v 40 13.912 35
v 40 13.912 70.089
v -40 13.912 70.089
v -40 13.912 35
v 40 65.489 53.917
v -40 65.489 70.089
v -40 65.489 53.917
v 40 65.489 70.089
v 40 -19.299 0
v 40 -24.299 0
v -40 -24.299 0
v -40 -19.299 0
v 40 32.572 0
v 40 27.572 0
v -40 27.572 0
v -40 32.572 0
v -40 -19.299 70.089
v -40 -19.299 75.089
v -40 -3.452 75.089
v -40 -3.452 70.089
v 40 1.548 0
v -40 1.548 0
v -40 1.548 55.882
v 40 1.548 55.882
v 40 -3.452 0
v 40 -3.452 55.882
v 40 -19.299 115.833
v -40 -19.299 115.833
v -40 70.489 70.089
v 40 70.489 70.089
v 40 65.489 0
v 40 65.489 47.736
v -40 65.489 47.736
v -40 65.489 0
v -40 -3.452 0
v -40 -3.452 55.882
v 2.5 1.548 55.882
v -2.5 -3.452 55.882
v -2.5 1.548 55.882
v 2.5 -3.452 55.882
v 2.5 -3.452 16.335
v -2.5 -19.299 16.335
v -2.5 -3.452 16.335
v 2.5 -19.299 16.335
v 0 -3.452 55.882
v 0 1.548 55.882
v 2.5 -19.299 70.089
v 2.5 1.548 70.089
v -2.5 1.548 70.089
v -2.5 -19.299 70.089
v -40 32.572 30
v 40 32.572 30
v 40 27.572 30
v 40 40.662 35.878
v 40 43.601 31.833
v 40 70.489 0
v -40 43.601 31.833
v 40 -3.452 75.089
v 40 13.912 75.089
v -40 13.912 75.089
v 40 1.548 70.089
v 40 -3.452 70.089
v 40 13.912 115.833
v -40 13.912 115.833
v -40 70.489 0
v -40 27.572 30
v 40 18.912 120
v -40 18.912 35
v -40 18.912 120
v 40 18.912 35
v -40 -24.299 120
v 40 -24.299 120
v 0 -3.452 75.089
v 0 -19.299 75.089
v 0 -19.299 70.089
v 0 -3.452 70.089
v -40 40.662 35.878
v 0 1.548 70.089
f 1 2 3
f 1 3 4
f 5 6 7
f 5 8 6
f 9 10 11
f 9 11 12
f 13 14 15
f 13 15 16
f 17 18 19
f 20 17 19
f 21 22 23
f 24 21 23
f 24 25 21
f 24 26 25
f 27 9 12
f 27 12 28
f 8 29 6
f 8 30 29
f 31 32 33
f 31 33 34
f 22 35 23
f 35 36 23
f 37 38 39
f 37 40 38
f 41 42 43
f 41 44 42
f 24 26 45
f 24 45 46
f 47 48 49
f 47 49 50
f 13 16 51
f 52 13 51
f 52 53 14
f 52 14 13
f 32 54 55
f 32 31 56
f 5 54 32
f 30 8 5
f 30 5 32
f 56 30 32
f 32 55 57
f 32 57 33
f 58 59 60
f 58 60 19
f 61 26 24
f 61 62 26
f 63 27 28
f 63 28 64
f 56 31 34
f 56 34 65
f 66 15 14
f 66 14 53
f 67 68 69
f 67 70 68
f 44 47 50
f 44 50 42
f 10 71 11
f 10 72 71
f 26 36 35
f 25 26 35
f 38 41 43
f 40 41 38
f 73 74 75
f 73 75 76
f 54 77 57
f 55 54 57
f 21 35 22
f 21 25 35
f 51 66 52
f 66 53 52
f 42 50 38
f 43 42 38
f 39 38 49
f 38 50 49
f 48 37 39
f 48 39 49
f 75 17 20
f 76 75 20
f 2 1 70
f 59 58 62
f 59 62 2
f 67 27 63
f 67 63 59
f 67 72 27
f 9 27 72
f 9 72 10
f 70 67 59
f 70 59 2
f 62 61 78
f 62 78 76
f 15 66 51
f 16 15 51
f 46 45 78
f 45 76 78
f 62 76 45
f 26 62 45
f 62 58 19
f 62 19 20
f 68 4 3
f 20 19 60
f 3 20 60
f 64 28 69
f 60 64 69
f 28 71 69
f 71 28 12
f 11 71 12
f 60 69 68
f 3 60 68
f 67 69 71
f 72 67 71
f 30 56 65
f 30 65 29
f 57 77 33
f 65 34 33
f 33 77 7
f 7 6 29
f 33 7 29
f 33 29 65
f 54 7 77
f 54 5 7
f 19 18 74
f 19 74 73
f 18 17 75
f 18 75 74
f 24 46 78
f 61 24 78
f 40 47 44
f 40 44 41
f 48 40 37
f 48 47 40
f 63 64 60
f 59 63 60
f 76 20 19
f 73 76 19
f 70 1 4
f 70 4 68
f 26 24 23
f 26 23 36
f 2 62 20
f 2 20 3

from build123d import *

# Parameters (mm, degrees)
F0_W     = 5
F0_H     = 35.0891035924
F1_DEPTH = 40
F0_H_2   = 30
F2_DEPTH = 2.5
F3_DEPTH = 40
F0_W_2   = 15.8472226467
F0_H_3   = 5
F4_DEPTH = 40


# Not quite as in the source:
# - a feature names something its author has since deleted; it is built from what else it names


with BuildPart() as f1:
    # F0 (on Right) → F1 (new body, symmetric)
    with BuildSketch(Plane.YZ):
        Polygon((13.9119866523, 115.8329709044), (13.9119866523, 120), (-24.2988105118, 120), (-24.2988105118, 115.8329709044), (-19.2988105118, 115.8329709044), align=None)
        Polygon((-24.2988105118, 0), (-19.2988105118, 0), (-19.2988105118, 16.3352508098), (-19.2988105118, 70.0891035924), (-19.2988105118, 75.0891035924), (-19.2988105118, 115.8329709044), (-24.2988105118, 115.8329709044), align=None)
        Polygon((13.9119866523, 70.0891035924), (18.9119866523, 70.0891035924), (18.9119866523, 120), (13.9119866523, 120), (13.9119866523, 115.8329709044), (13.9119866523, 75.0891035924), align=None)
        with Locations((16.4119866523, 52.5445517962)):
            Rectangle(F0_W, F0_H)
        Polygon((0, 70.0891035924), (1.5484121349, 70.0891035924), (13.9119866523, 70.0891035924), (13.9119866523, 75.0891035924), (-3.4515878651, 75.0891035924), (-3.4515878651, 70.0891035924), align=None)
    extrude(amount=F1_DEPTH, both=True)


with BuildPart() as f1b:
    # F0 (on Right) → F1, piece 2 (new body, symmetric)
    with BuildSketch(Plane.YZ):
        with Locations((30.0722406902, 15)):
            Rectangle(F0_W, F0_H_2)
    extrude(amount=F1_DEPTH, both=True)


with BuildPart() as f1c:
    # F0 (on Right) → F1, piece 3 (new body, symmetric)
    with BuildSketch(Plane.YZ):
        Polygon((65.4894374425, 53.9165928793), (40.6623113469, 35.8779891774), (43.6013059356, 31.8329538491), (65.4894374425, 47.7361771423), align=None)
        Polygon((65.4894374425, 47.7361771423), (65.4894374425, 0), (70.4894374425, 0), (70.4894374425, 53.9366312392), (70.4894374425, 70.0891035924), (65.4894374425, 70.0891035924), (65.4894374425, 53.9165928793), align=None)
    extrude(amount=F1_DEPTH, both=True)


with BuildPart() as f1d:
    # F0 (on Right) → F1, piece 4 (new body, symmetric)
    with BuildSketch(Plane.YZ):
        Polygon((-3.4515878651, 0), (1.5484121349, 0), (1.5484121349, 55.8824166656), (-3.4515878651, 55.8824166656), (-3.4515878651, 16.3352508098), align=None)
    extrude(amount=F1_DEPTH, both=True)


with BuildPart() as f2:
    # F0 (on Right) → F2 (new body, symmetric)
    with BuildSketch(Plane.YZ):
        Polygon((-3.4515878651, 55.8824166656), (1.5484121349, 55.8824166656), (1.5484121349, 70.0891035924), (0, 70.0891035924), (-3.4515878651, 70.0891035924), align=None)
        Polygon((-19.2988105118, 16.3352508098), (-3.4515878651, 16.3352508098), (-3.4515878651, 55.8824166656), (-3.4515878651, 70.0891035924), (-19.2988105118, 70.0891035924), align=None)
    extrude(amount=F2_DEPTH, both=True)


with BuildPart() as f3:
    # F0 (on Right) → F3 (new body, through all)
    with BuildSketch(Plane.YZ):
        Polygon((-3.4515878651, 55.8824166656), (1.5484121349, 55.8824166656), (1.5484121349, 70.0891035924), (0, 70.0891035924), (-3.4515878651, 70.0891035924), align=None)
    extrude(amount=F3_DEPTH)


with BuildPart() as f4:
    # F0 (on Right) → F4 (new body, through all)
    with BuildSketch(Plane.YZ):
        with Locations((-11.3751991885, 72.5891035924)):
            Rectangle(F0_W_2, F0_H_3)
    extrude(amount=-F4_DEPTH)


solid = Compound([f1.part, f1b.part, f1c.part, f1d.part, f2.part, f3.part, f4.part])
